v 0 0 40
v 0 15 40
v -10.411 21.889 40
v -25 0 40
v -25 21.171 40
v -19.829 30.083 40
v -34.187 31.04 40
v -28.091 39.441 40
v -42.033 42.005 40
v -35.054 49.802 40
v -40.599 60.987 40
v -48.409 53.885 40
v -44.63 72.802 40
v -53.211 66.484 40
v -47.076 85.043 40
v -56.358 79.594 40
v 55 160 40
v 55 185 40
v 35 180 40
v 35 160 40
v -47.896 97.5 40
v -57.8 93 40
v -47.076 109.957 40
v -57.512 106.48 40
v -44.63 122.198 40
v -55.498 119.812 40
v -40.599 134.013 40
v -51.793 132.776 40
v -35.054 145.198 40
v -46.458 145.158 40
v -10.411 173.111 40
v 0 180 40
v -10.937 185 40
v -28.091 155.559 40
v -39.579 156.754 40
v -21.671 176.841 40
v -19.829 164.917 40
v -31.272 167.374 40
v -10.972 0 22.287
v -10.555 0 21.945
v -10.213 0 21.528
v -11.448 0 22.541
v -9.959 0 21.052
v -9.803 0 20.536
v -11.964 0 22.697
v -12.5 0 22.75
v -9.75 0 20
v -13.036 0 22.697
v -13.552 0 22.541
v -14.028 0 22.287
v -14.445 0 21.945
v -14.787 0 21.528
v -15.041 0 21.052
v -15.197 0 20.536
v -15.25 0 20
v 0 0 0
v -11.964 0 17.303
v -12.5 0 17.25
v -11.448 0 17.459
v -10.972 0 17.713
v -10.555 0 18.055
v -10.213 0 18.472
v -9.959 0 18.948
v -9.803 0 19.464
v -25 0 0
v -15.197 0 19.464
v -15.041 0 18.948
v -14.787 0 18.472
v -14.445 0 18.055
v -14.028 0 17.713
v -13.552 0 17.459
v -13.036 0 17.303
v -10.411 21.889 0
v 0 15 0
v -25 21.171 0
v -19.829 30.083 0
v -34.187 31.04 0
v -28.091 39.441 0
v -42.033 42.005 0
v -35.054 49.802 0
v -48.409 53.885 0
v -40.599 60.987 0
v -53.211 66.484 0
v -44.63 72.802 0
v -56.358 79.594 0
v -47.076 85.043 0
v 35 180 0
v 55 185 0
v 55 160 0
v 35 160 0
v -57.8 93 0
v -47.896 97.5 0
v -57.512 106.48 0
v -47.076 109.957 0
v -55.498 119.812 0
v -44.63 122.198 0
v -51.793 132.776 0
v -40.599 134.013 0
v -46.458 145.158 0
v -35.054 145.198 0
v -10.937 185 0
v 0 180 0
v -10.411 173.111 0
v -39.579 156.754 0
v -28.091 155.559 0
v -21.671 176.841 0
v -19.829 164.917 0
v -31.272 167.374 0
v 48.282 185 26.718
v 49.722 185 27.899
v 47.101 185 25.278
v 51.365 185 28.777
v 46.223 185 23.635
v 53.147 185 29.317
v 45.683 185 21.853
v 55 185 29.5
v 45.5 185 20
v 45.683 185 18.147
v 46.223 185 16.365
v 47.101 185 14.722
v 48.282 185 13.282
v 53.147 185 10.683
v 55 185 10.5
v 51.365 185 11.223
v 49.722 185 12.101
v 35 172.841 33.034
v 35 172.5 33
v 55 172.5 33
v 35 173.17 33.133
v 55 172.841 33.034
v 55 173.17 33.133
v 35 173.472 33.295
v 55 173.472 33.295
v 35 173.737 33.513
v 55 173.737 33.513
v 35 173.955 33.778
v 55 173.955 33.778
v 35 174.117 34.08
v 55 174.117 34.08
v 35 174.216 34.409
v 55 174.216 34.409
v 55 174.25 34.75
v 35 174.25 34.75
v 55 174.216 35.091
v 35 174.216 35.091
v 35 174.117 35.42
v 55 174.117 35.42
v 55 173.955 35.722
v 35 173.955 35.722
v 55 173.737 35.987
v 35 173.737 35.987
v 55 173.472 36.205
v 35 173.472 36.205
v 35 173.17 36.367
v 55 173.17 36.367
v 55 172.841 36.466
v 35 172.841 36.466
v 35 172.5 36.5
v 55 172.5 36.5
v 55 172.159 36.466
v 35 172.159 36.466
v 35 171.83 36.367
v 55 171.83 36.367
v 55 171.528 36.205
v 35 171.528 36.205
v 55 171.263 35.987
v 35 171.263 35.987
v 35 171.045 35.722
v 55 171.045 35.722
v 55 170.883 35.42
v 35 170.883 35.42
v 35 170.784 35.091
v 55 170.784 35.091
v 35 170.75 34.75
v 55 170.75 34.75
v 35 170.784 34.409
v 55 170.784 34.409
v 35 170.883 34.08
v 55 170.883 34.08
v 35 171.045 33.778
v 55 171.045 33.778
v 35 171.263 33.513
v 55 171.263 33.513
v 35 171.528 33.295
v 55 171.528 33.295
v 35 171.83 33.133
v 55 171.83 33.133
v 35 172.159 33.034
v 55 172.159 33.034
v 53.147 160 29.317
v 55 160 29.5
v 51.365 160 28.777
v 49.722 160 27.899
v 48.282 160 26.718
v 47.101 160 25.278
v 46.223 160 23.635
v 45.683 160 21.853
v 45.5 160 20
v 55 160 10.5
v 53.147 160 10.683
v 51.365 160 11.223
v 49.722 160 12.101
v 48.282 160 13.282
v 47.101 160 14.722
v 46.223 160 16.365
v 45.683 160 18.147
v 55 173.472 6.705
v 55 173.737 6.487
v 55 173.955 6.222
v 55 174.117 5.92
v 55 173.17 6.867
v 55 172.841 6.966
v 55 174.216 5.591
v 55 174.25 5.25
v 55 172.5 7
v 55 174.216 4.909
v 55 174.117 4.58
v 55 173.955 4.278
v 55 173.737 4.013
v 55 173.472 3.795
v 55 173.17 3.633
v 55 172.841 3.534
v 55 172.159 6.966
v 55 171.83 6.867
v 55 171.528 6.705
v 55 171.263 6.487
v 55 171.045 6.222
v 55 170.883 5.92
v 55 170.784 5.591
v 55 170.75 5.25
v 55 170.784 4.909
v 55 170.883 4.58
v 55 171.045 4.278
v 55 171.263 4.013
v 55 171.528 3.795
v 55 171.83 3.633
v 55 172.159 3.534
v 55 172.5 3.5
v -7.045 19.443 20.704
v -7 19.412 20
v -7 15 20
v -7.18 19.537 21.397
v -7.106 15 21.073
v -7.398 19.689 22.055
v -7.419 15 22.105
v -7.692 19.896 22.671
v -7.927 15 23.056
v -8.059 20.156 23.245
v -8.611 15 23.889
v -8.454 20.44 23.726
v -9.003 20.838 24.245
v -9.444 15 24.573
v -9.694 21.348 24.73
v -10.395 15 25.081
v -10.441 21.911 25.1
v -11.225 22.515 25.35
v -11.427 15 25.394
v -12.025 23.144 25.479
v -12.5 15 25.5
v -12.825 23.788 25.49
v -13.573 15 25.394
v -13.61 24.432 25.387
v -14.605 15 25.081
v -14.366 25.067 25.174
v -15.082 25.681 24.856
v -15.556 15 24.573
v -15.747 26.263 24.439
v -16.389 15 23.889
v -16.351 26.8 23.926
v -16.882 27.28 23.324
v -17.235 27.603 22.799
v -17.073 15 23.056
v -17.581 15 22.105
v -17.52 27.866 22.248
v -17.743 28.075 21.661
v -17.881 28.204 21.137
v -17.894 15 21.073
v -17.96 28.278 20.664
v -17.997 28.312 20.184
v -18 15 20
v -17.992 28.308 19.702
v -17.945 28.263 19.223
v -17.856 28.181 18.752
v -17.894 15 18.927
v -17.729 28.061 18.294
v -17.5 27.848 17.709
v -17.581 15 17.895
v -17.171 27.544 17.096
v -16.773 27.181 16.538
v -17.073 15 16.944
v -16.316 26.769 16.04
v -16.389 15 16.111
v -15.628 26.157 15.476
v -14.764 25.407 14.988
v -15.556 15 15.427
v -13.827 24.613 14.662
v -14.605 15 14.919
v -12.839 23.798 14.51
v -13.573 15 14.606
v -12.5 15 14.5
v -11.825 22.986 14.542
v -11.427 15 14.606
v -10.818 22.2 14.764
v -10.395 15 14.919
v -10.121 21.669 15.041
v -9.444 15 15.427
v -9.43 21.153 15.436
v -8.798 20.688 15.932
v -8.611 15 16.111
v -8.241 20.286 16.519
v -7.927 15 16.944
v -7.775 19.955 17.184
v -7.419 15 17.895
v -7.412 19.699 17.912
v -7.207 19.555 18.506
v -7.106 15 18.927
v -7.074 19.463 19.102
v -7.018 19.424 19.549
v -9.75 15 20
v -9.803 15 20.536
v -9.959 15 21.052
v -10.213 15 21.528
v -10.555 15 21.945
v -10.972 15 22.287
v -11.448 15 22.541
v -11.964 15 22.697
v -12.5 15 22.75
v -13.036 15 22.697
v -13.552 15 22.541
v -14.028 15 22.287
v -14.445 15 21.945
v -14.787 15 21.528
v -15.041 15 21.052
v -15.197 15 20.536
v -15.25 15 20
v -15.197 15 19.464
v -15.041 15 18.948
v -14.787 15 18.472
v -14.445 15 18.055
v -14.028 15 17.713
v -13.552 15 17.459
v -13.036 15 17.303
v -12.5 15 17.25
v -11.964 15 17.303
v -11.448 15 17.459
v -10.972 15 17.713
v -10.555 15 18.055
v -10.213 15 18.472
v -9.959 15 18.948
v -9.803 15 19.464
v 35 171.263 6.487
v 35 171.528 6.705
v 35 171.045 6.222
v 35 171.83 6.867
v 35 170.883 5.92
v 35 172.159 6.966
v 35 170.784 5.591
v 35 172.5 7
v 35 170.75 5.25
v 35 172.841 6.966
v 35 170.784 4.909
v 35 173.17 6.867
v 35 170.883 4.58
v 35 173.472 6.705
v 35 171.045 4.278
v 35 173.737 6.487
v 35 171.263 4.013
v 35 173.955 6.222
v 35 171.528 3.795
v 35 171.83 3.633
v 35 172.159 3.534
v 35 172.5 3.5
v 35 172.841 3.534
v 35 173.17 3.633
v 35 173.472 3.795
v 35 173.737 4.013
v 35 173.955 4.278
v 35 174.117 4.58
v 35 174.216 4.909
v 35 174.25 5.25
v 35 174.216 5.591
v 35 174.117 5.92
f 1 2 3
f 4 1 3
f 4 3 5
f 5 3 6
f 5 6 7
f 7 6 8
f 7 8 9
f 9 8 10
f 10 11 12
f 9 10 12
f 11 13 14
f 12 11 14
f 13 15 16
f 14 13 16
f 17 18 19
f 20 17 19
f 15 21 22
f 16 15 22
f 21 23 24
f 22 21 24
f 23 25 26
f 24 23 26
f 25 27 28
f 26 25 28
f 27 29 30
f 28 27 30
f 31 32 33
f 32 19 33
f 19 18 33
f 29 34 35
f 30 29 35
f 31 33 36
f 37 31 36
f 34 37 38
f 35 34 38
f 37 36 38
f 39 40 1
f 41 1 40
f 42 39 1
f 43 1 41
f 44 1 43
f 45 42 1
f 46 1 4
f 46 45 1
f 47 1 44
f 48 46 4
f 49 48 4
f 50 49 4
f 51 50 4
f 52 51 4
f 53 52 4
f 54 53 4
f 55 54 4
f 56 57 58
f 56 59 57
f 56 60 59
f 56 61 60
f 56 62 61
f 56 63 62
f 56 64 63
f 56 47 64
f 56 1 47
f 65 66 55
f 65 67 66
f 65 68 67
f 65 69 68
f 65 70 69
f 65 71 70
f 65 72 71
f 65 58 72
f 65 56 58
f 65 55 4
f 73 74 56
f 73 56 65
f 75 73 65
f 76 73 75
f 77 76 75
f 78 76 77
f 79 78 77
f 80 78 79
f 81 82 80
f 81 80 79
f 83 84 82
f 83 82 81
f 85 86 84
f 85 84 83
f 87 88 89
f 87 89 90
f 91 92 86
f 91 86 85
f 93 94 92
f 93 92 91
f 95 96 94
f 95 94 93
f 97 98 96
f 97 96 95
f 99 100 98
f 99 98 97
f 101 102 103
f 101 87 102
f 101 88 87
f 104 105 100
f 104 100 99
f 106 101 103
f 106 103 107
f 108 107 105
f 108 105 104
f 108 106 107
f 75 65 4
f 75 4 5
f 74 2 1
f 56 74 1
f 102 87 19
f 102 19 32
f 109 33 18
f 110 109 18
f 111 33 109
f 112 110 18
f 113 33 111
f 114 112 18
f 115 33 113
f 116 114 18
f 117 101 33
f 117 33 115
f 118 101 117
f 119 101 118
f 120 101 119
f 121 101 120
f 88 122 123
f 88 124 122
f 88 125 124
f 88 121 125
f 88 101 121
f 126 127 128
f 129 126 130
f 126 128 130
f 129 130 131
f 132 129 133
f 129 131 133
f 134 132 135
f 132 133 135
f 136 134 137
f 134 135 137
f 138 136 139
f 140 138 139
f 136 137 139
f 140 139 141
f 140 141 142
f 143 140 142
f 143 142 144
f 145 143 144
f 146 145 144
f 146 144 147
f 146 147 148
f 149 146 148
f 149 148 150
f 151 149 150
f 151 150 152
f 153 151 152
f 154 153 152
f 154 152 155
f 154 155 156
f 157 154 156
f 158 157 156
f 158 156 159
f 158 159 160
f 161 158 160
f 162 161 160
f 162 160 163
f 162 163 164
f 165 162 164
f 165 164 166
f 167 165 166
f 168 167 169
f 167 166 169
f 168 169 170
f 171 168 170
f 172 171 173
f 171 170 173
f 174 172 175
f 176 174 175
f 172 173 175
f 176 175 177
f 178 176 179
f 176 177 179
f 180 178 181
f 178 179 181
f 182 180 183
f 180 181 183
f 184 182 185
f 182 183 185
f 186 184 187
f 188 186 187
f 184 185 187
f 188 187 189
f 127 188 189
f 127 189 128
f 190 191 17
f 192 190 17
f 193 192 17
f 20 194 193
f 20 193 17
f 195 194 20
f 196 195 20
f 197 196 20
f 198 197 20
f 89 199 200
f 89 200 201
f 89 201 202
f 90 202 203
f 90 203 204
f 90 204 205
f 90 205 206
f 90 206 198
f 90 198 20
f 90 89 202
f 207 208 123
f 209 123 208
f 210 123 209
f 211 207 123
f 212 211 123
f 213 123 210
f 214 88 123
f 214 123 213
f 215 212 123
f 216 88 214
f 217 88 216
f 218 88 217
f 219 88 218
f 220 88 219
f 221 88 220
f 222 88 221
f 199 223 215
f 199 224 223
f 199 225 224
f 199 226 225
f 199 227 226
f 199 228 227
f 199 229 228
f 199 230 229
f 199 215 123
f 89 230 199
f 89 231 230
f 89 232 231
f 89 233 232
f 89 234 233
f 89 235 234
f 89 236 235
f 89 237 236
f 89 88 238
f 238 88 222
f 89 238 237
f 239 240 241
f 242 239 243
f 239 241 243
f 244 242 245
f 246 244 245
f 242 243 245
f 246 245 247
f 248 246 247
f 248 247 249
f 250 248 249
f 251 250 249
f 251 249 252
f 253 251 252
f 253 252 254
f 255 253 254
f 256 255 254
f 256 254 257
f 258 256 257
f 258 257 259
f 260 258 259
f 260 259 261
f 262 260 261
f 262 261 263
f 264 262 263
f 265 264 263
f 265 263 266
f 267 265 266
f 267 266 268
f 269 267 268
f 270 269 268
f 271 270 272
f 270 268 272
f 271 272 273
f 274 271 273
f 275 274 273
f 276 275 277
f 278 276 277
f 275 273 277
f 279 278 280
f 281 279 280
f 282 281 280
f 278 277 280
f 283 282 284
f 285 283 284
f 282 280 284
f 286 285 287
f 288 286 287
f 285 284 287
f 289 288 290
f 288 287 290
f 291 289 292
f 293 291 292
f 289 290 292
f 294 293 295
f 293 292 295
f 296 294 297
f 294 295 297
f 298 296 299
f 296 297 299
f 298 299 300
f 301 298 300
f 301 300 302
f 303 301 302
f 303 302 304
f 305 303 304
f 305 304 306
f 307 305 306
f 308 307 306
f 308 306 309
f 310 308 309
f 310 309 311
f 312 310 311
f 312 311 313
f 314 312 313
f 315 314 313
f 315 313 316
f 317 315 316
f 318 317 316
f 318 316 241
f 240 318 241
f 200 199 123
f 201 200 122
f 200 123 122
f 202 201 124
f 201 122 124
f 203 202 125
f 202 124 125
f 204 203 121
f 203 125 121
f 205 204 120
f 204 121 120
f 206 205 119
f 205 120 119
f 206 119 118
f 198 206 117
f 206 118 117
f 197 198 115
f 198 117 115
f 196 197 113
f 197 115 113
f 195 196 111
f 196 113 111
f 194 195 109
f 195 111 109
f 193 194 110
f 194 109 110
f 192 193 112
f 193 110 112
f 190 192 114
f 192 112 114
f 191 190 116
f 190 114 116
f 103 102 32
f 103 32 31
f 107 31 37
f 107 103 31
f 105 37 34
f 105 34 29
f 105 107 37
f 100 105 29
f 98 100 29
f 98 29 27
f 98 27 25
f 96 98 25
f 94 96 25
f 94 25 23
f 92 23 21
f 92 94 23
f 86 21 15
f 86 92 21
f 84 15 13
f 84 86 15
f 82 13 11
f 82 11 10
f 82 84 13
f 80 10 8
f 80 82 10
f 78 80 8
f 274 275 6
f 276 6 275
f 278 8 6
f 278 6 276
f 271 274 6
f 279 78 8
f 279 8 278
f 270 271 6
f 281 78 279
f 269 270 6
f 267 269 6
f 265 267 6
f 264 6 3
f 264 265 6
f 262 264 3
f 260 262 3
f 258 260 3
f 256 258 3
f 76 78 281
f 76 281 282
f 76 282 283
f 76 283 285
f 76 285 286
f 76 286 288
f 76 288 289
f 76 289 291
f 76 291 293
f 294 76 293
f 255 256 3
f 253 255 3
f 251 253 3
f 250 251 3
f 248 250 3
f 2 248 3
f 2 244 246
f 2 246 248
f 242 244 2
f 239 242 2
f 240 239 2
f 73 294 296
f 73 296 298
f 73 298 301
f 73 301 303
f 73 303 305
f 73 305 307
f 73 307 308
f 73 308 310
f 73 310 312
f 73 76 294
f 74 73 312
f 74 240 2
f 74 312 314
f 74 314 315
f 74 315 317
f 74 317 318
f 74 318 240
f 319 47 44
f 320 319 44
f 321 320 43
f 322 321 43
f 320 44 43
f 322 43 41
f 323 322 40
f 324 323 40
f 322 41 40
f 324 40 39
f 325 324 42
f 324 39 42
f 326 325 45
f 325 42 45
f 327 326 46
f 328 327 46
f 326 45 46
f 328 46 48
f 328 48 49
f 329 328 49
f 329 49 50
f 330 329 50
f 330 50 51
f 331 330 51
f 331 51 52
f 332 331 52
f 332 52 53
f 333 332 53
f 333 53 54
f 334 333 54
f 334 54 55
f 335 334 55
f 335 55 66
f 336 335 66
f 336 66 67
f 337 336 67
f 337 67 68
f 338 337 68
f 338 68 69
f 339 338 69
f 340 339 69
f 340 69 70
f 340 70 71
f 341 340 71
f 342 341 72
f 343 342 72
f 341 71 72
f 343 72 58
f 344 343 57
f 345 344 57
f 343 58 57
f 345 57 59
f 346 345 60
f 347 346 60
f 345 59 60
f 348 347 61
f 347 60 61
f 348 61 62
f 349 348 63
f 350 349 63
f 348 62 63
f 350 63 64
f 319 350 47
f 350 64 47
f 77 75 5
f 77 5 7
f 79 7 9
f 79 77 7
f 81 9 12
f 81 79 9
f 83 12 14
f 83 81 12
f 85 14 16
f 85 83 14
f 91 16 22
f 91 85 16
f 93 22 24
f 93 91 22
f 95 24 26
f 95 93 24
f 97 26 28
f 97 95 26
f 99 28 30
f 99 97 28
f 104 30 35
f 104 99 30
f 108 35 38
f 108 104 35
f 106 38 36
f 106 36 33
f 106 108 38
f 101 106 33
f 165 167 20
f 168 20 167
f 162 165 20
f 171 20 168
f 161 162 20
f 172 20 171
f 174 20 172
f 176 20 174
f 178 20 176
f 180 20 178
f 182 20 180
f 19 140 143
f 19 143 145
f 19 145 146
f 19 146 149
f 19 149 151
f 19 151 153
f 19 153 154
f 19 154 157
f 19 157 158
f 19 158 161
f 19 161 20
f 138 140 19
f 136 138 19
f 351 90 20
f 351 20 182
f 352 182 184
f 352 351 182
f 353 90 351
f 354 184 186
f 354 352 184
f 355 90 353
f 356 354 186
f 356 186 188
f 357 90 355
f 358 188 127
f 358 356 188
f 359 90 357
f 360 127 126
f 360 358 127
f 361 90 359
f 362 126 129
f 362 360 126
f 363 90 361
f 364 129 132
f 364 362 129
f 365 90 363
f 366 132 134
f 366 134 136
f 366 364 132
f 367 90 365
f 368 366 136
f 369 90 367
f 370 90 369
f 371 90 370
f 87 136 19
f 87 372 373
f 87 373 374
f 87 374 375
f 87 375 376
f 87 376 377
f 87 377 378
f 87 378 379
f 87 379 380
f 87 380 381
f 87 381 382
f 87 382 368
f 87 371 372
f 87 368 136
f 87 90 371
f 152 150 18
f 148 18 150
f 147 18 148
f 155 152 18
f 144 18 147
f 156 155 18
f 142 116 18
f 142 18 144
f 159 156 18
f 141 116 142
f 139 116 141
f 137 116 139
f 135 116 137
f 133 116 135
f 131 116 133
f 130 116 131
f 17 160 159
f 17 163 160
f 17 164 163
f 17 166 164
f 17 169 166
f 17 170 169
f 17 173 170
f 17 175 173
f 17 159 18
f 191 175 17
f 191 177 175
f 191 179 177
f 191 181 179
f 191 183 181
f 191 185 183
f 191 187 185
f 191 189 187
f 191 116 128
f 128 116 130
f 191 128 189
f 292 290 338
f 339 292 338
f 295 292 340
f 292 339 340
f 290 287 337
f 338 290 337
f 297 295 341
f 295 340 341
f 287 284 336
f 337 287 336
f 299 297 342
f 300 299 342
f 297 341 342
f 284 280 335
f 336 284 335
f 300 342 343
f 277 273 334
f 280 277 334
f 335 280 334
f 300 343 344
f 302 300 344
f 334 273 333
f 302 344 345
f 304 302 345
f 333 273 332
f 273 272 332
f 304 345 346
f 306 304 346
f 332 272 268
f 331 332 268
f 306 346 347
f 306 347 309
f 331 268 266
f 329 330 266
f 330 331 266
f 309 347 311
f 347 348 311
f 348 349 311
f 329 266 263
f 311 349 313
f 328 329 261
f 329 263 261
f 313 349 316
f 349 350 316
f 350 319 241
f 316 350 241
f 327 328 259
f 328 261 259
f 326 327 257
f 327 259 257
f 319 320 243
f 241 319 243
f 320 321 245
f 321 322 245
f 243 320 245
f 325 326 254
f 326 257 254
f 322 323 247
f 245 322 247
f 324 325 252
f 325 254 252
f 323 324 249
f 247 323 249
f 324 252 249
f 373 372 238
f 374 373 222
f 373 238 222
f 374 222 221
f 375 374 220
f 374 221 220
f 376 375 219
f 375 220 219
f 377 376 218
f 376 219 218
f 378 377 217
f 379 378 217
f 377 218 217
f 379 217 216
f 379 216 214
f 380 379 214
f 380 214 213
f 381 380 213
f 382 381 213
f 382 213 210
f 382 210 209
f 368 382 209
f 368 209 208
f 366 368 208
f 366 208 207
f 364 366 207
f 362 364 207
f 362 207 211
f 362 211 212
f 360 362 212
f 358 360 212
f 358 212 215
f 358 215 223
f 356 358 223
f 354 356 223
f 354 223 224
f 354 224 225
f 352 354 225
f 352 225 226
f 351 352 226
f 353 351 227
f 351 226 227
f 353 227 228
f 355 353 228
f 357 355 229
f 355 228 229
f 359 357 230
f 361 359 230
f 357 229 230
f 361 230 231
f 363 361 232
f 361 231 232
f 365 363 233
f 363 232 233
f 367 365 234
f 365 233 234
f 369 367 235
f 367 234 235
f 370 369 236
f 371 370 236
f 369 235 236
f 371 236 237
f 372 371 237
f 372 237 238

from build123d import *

# Parameters (mm, degrees)
BOSS_EXTRUDE1_DEPTH = 40
SKETCH2_R           = 9.5
CUT_EXTRUDE1_DEPTH  = 186
SKETCH3_R           = 2.75
CUT_EXTRUDE2_DEPTH  = 40
CUT_EXTRUDE3_START  = -15
SKETCH4_R           = 5.5
CUT_EXTRUDE3_DEPTH  = 29
SKETCH5_R           = 1.75
CUT_EXTRUDE4_DEPTH  = 31


with BuildPart() as part:
    # Sketch1 → Boss-Extrude1 (new body)
    with BuildSketch(Plane.XY):
        with BuildLine():
            ThreePointArc((0, 180), (-47.896390796, 97.5), (0, 15))
            Line((0, 15), (0, 0))
            Line((0, 0), (-25, 0))
            Line((-25, 0), (-25, 21.171305921))
            ThreePointArc((-25, 21.171305921), (-57.511689732, 106.47993478), (-10.937324628, 185))
            Line((-10.937324628, 185), (55, 185))
            Line((55, 185), (55, 160))
            Line((55, 160), (35, 160))
            Line((35, 160), (35, 180))
            Line((35, 180), (0, 180))
        make_face()
    extrude(amount=BOSS_EXTRUDE1_DEPTH)

    # Sketch2 → Cut-Extrude1 (cut, through all)
    with BuildSketch(Plane(origin=(0, 185, 0), x_dir=(1, 0, 0), z_dir=(0, 1, 0))):
        with Locations((55, -20)):
            Circle(SKETCH2_R)
    extrude(amount=-CUT_EXTRUDE1_DEPTH, mode=Mode.SUBTRACT)

    # Sketch3 → Cut-Extrude2 (cut)
    with BuildSketch(Plane.XZ):
        with Locations((-12.5, 20)):
            Circle(SKETCH3_R)
    extrude(amount=-CUT_EXTRUDE2_DEPTH, mode=Mode.SUBTRACT)

    # Sketch4 → Cut-Extrude3 (cut)
    with BuildSketch(Plane.XZ.offset(CUT_EXTRUDE3_START)):
        with Locations((-12.5, 20)):
            Circle(SKETCH4_R)
    extrude(amount=-CUT_EXTRUDE3_DEPTH, mode=Mode.SUBTRACT)

    # Sketch5 → Cut-Extrude4 (cut)
    with BuildSketch(Plane(origin=(55, 0, 0), x_dir=(0, 0, -1), z_dir=(1, 0, 0))):
        with Locations((-5.25, 172.5)):
            Circle(SKETCH5_R)
        with Locations((-34.75, 172.5)):
            Circle(SKETCH5_R)
    extrude(amount=-CUT_EXTRUDE4_DEPTH, mode=Mode.SUBTRACT)


solid = part.part
